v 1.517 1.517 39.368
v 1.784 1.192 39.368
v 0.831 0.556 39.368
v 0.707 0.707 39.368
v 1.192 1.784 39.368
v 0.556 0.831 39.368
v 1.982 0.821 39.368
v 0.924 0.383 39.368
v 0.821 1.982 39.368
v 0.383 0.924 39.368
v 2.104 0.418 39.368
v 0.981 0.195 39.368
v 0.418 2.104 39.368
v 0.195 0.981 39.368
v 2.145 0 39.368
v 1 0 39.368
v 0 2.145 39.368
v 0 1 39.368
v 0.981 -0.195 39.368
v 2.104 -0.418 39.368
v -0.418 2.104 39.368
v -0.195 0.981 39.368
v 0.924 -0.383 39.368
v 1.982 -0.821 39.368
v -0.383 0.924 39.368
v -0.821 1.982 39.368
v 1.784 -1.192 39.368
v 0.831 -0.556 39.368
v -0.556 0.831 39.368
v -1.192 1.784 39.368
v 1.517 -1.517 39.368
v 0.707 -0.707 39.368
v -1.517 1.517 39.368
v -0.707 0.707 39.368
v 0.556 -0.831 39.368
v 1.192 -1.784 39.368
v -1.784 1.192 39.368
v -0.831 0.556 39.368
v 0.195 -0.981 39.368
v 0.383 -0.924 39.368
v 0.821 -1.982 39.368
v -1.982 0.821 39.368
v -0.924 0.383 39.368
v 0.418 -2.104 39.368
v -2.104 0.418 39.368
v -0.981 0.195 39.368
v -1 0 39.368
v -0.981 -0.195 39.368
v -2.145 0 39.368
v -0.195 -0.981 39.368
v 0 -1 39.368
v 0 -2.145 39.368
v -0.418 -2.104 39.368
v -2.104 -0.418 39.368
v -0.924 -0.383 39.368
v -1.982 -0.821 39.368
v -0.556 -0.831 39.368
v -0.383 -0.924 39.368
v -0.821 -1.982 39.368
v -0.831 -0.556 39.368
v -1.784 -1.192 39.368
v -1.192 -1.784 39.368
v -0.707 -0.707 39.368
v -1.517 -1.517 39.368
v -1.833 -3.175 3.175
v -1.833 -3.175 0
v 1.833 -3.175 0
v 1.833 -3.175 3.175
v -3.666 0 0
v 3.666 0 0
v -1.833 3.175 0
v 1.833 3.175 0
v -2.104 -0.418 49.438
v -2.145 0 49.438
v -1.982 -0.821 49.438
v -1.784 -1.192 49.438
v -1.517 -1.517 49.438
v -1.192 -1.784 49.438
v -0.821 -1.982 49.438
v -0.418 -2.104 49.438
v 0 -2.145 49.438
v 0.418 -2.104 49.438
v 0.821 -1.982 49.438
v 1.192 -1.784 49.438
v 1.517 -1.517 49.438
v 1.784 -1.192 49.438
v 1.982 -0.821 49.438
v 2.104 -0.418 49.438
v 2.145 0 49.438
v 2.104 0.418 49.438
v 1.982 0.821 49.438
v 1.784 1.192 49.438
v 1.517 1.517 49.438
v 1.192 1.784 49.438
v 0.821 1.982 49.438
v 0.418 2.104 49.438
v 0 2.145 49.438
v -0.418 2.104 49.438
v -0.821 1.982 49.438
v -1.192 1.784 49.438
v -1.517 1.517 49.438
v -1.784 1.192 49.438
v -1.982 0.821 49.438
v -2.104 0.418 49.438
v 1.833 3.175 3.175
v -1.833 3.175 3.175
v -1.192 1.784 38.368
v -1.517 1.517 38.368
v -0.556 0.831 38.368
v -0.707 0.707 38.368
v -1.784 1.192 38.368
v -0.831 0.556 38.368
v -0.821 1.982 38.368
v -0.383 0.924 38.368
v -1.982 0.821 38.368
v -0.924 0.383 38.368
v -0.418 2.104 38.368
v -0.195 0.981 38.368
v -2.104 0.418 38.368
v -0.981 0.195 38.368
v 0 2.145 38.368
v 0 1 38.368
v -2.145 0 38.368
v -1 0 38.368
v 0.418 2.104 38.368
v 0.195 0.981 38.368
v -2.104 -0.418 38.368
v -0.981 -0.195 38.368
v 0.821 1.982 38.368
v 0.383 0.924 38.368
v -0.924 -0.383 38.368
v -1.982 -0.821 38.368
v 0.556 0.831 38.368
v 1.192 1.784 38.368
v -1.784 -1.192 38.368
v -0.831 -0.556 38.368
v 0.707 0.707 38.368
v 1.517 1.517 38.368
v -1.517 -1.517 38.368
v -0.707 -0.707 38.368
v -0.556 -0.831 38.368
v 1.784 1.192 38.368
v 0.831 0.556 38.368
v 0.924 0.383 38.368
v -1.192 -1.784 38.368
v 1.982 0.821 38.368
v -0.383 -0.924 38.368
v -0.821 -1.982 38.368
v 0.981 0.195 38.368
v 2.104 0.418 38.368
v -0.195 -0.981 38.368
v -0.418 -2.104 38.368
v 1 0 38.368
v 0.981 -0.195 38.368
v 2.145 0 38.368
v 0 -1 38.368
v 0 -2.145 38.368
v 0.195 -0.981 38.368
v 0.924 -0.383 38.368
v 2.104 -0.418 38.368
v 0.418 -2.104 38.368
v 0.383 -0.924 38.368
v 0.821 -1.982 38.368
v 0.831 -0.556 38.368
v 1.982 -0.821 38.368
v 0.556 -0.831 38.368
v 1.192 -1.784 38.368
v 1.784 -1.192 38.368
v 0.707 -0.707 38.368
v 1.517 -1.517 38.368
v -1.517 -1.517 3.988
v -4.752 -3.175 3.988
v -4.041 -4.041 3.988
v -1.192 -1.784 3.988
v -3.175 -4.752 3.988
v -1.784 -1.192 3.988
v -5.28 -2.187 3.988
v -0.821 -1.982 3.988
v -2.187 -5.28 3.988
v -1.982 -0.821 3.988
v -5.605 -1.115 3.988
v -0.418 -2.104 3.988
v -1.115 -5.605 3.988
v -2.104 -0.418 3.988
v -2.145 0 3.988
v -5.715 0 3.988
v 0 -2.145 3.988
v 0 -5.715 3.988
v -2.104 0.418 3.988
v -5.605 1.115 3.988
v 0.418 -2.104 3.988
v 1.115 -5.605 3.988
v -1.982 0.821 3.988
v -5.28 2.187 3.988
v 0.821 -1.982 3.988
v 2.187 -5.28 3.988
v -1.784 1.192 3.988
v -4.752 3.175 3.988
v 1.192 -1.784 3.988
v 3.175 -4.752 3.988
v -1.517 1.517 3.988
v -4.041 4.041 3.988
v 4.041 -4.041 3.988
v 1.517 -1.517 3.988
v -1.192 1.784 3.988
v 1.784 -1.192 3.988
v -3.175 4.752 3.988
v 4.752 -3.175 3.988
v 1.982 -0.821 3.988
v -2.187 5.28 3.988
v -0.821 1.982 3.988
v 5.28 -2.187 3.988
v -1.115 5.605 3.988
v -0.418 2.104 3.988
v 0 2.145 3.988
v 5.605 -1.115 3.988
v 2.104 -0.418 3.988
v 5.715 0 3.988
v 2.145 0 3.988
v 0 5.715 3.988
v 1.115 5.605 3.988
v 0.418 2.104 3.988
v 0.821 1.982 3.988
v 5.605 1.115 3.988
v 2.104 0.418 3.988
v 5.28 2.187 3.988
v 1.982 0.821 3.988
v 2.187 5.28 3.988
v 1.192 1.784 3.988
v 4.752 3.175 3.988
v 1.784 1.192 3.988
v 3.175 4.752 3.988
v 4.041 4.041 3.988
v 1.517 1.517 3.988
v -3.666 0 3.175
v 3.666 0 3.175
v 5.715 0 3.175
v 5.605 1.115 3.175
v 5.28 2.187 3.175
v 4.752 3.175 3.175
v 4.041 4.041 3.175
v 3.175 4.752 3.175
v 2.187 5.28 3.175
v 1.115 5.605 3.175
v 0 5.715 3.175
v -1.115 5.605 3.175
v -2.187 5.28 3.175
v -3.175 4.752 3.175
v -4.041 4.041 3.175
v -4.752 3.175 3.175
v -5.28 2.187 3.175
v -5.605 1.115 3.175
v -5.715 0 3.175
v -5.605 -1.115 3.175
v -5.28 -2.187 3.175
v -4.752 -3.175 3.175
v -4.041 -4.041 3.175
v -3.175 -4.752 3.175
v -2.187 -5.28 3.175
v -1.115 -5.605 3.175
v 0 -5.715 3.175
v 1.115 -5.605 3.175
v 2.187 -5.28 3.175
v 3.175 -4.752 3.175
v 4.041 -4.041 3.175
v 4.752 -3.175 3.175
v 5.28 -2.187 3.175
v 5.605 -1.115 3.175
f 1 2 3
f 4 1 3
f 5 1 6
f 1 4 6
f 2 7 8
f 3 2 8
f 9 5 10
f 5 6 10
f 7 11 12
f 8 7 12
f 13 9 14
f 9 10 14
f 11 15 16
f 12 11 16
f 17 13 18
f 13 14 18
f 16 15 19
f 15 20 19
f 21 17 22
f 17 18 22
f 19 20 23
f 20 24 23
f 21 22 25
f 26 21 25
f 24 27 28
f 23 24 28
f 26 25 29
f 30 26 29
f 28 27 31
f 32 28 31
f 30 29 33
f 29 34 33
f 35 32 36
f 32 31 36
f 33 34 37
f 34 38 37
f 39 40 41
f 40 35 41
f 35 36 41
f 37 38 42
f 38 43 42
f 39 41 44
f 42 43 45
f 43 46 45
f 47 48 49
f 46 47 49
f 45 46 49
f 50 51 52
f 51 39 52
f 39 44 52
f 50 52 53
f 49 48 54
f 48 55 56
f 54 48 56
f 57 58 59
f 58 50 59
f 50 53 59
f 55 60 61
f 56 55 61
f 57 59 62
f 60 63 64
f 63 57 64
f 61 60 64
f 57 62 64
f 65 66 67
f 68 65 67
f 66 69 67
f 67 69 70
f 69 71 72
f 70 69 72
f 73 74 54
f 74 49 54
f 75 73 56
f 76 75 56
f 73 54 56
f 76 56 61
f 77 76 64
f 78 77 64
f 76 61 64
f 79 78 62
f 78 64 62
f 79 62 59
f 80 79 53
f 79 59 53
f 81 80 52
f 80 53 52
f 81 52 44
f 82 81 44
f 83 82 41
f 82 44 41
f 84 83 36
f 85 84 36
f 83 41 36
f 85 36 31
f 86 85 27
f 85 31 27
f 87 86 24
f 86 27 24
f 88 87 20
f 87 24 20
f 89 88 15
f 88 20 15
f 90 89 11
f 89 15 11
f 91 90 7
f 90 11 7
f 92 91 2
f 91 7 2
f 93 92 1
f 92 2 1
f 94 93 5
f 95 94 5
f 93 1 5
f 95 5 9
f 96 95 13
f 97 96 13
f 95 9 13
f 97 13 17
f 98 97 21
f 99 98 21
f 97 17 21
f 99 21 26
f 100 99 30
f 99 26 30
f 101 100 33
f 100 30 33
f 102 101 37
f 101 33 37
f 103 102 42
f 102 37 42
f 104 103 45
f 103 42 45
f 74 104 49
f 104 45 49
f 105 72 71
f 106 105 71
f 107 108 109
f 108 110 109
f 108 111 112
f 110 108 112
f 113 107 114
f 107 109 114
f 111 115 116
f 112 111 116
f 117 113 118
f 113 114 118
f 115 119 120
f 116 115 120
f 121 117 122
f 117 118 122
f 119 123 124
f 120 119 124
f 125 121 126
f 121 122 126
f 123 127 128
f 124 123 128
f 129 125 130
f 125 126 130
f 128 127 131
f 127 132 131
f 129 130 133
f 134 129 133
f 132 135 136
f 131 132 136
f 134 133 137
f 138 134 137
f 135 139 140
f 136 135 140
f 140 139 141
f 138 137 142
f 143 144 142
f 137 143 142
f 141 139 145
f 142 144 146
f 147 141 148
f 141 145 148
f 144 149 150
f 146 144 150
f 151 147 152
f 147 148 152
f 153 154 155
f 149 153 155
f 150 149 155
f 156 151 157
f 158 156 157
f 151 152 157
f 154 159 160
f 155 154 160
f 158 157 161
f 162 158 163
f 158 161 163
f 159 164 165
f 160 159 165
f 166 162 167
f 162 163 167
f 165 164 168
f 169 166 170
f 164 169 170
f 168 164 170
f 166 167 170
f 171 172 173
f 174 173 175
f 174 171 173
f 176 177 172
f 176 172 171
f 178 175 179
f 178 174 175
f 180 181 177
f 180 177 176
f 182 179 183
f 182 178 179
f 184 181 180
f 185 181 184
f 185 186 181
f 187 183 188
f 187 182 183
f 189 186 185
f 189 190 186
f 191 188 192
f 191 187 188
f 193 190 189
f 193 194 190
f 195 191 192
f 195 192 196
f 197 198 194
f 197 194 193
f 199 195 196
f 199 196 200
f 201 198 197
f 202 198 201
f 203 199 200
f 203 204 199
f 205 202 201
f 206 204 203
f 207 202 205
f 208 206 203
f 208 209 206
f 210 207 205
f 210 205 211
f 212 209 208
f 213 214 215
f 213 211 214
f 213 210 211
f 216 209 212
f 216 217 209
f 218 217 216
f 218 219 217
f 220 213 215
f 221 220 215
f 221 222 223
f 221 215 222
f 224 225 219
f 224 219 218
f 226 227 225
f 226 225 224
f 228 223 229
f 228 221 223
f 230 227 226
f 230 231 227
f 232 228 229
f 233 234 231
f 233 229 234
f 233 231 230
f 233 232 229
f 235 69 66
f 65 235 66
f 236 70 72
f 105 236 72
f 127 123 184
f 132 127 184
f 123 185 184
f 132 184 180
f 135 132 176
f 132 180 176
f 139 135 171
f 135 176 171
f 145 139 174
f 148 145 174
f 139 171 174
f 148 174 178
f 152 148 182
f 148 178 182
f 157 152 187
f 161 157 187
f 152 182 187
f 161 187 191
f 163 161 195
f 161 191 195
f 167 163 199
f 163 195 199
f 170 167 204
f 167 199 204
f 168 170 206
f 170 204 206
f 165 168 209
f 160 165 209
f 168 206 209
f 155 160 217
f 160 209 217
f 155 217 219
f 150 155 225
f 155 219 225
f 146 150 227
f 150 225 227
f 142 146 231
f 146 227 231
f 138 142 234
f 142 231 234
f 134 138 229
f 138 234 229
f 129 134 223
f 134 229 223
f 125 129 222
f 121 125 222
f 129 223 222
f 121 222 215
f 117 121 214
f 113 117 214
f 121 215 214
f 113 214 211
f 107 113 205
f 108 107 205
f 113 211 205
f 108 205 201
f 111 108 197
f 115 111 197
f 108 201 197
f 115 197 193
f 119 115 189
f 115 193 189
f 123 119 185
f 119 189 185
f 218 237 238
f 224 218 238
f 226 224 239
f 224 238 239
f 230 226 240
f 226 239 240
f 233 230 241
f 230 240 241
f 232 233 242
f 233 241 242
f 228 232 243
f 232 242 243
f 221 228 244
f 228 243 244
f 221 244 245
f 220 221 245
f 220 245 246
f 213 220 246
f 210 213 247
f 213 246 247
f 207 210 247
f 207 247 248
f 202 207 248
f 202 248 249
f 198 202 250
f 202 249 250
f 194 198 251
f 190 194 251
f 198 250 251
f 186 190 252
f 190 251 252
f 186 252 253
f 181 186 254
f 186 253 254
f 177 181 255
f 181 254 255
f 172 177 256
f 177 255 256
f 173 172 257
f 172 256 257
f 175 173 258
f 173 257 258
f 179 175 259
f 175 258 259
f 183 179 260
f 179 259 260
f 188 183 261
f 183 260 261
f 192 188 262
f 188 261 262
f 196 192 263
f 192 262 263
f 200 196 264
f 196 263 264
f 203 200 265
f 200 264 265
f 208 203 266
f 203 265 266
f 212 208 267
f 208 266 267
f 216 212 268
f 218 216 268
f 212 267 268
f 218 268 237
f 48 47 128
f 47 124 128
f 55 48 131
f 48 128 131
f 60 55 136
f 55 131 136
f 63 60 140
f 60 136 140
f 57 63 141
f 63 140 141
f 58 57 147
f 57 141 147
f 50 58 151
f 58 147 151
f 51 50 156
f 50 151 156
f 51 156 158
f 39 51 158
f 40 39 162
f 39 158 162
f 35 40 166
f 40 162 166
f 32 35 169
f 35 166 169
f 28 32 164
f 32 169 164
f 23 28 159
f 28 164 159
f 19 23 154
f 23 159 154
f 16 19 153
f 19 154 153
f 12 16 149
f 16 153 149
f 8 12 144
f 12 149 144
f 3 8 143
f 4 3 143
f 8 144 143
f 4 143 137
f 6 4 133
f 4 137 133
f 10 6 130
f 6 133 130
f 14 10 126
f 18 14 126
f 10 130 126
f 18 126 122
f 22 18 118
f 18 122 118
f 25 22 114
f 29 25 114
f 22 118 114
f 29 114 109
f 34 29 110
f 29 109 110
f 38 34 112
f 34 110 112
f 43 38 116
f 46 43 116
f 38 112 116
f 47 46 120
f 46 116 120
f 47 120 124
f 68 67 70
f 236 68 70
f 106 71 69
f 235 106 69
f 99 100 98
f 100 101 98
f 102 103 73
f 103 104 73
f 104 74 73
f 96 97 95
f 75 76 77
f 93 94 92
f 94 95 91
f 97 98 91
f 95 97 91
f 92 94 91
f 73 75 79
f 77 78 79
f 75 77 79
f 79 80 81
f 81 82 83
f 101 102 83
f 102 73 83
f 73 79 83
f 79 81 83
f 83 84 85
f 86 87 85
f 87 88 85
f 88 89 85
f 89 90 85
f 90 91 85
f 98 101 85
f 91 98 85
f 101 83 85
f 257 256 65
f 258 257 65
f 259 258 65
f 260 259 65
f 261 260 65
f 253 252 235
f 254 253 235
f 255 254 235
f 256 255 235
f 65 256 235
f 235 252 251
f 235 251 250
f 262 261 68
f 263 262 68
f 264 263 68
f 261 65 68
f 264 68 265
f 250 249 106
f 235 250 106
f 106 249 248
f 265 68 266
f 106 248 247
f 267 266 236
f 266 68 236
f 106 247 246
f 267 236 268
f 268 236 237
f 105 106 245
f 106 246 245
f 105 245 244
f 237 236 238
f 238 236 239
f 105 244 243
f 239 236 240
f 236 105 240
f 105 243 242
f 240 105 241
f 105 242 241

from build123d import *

# Parameters (mm, degrees)
BOSS_EXTRUDE1_DEPTH = 3.175
SKETCH2_R           = 5.715
BOSS_EXTRUDE2_DEPTH = 0.8128


with BuildPart() as part:
    # Sketch1 → Boss-Extrude1 (new body)
    with BuildSketch(Plane.XY):
        Polygon((3.666174209, 0), (1.833087105, 3.175), (-1.833087105, 3.175), (-3.666174209, 0), (-1.833087105, -3.175), (1.833087105, -3.175), align=None)
    extrude(amount=BOSS_EXTRUDE1_DEPTH)

    # Sketch2 → Boss-Extrude2 (add)
    with BuildSketch(Plane.XY.offset(3.175)):
        Circle(SKETCH2_R)
    extrude(amount=BOSS_EXTRUDE2_DEPTH)

    # Sketch3 → Revolve1 (revolve)
    with BuildSketch(Plane(origin=(0, 0, 0), x_dir=(0, 0, -1), z_dir=(1, 0, 0)), mode=Mode.PRIVATE) as revolve1_sk:
        Polygon((-3.9878, 0), (-49.4378, 0), (-49.4378, 2.145), (-39.3678, 2.145), (-39.3678, 1), (-38.3678, 1), (-38.3678, 2.145), (-3.9878, 2.145), align=None)
    revolve(revolve1_sk.sketch.rotate(Axis((0, 0, 3.9878), (0, 0, 1)), 90), axis=Axis((0, 0, 3.9878), (0, 0, 1)))


solid = part.part
